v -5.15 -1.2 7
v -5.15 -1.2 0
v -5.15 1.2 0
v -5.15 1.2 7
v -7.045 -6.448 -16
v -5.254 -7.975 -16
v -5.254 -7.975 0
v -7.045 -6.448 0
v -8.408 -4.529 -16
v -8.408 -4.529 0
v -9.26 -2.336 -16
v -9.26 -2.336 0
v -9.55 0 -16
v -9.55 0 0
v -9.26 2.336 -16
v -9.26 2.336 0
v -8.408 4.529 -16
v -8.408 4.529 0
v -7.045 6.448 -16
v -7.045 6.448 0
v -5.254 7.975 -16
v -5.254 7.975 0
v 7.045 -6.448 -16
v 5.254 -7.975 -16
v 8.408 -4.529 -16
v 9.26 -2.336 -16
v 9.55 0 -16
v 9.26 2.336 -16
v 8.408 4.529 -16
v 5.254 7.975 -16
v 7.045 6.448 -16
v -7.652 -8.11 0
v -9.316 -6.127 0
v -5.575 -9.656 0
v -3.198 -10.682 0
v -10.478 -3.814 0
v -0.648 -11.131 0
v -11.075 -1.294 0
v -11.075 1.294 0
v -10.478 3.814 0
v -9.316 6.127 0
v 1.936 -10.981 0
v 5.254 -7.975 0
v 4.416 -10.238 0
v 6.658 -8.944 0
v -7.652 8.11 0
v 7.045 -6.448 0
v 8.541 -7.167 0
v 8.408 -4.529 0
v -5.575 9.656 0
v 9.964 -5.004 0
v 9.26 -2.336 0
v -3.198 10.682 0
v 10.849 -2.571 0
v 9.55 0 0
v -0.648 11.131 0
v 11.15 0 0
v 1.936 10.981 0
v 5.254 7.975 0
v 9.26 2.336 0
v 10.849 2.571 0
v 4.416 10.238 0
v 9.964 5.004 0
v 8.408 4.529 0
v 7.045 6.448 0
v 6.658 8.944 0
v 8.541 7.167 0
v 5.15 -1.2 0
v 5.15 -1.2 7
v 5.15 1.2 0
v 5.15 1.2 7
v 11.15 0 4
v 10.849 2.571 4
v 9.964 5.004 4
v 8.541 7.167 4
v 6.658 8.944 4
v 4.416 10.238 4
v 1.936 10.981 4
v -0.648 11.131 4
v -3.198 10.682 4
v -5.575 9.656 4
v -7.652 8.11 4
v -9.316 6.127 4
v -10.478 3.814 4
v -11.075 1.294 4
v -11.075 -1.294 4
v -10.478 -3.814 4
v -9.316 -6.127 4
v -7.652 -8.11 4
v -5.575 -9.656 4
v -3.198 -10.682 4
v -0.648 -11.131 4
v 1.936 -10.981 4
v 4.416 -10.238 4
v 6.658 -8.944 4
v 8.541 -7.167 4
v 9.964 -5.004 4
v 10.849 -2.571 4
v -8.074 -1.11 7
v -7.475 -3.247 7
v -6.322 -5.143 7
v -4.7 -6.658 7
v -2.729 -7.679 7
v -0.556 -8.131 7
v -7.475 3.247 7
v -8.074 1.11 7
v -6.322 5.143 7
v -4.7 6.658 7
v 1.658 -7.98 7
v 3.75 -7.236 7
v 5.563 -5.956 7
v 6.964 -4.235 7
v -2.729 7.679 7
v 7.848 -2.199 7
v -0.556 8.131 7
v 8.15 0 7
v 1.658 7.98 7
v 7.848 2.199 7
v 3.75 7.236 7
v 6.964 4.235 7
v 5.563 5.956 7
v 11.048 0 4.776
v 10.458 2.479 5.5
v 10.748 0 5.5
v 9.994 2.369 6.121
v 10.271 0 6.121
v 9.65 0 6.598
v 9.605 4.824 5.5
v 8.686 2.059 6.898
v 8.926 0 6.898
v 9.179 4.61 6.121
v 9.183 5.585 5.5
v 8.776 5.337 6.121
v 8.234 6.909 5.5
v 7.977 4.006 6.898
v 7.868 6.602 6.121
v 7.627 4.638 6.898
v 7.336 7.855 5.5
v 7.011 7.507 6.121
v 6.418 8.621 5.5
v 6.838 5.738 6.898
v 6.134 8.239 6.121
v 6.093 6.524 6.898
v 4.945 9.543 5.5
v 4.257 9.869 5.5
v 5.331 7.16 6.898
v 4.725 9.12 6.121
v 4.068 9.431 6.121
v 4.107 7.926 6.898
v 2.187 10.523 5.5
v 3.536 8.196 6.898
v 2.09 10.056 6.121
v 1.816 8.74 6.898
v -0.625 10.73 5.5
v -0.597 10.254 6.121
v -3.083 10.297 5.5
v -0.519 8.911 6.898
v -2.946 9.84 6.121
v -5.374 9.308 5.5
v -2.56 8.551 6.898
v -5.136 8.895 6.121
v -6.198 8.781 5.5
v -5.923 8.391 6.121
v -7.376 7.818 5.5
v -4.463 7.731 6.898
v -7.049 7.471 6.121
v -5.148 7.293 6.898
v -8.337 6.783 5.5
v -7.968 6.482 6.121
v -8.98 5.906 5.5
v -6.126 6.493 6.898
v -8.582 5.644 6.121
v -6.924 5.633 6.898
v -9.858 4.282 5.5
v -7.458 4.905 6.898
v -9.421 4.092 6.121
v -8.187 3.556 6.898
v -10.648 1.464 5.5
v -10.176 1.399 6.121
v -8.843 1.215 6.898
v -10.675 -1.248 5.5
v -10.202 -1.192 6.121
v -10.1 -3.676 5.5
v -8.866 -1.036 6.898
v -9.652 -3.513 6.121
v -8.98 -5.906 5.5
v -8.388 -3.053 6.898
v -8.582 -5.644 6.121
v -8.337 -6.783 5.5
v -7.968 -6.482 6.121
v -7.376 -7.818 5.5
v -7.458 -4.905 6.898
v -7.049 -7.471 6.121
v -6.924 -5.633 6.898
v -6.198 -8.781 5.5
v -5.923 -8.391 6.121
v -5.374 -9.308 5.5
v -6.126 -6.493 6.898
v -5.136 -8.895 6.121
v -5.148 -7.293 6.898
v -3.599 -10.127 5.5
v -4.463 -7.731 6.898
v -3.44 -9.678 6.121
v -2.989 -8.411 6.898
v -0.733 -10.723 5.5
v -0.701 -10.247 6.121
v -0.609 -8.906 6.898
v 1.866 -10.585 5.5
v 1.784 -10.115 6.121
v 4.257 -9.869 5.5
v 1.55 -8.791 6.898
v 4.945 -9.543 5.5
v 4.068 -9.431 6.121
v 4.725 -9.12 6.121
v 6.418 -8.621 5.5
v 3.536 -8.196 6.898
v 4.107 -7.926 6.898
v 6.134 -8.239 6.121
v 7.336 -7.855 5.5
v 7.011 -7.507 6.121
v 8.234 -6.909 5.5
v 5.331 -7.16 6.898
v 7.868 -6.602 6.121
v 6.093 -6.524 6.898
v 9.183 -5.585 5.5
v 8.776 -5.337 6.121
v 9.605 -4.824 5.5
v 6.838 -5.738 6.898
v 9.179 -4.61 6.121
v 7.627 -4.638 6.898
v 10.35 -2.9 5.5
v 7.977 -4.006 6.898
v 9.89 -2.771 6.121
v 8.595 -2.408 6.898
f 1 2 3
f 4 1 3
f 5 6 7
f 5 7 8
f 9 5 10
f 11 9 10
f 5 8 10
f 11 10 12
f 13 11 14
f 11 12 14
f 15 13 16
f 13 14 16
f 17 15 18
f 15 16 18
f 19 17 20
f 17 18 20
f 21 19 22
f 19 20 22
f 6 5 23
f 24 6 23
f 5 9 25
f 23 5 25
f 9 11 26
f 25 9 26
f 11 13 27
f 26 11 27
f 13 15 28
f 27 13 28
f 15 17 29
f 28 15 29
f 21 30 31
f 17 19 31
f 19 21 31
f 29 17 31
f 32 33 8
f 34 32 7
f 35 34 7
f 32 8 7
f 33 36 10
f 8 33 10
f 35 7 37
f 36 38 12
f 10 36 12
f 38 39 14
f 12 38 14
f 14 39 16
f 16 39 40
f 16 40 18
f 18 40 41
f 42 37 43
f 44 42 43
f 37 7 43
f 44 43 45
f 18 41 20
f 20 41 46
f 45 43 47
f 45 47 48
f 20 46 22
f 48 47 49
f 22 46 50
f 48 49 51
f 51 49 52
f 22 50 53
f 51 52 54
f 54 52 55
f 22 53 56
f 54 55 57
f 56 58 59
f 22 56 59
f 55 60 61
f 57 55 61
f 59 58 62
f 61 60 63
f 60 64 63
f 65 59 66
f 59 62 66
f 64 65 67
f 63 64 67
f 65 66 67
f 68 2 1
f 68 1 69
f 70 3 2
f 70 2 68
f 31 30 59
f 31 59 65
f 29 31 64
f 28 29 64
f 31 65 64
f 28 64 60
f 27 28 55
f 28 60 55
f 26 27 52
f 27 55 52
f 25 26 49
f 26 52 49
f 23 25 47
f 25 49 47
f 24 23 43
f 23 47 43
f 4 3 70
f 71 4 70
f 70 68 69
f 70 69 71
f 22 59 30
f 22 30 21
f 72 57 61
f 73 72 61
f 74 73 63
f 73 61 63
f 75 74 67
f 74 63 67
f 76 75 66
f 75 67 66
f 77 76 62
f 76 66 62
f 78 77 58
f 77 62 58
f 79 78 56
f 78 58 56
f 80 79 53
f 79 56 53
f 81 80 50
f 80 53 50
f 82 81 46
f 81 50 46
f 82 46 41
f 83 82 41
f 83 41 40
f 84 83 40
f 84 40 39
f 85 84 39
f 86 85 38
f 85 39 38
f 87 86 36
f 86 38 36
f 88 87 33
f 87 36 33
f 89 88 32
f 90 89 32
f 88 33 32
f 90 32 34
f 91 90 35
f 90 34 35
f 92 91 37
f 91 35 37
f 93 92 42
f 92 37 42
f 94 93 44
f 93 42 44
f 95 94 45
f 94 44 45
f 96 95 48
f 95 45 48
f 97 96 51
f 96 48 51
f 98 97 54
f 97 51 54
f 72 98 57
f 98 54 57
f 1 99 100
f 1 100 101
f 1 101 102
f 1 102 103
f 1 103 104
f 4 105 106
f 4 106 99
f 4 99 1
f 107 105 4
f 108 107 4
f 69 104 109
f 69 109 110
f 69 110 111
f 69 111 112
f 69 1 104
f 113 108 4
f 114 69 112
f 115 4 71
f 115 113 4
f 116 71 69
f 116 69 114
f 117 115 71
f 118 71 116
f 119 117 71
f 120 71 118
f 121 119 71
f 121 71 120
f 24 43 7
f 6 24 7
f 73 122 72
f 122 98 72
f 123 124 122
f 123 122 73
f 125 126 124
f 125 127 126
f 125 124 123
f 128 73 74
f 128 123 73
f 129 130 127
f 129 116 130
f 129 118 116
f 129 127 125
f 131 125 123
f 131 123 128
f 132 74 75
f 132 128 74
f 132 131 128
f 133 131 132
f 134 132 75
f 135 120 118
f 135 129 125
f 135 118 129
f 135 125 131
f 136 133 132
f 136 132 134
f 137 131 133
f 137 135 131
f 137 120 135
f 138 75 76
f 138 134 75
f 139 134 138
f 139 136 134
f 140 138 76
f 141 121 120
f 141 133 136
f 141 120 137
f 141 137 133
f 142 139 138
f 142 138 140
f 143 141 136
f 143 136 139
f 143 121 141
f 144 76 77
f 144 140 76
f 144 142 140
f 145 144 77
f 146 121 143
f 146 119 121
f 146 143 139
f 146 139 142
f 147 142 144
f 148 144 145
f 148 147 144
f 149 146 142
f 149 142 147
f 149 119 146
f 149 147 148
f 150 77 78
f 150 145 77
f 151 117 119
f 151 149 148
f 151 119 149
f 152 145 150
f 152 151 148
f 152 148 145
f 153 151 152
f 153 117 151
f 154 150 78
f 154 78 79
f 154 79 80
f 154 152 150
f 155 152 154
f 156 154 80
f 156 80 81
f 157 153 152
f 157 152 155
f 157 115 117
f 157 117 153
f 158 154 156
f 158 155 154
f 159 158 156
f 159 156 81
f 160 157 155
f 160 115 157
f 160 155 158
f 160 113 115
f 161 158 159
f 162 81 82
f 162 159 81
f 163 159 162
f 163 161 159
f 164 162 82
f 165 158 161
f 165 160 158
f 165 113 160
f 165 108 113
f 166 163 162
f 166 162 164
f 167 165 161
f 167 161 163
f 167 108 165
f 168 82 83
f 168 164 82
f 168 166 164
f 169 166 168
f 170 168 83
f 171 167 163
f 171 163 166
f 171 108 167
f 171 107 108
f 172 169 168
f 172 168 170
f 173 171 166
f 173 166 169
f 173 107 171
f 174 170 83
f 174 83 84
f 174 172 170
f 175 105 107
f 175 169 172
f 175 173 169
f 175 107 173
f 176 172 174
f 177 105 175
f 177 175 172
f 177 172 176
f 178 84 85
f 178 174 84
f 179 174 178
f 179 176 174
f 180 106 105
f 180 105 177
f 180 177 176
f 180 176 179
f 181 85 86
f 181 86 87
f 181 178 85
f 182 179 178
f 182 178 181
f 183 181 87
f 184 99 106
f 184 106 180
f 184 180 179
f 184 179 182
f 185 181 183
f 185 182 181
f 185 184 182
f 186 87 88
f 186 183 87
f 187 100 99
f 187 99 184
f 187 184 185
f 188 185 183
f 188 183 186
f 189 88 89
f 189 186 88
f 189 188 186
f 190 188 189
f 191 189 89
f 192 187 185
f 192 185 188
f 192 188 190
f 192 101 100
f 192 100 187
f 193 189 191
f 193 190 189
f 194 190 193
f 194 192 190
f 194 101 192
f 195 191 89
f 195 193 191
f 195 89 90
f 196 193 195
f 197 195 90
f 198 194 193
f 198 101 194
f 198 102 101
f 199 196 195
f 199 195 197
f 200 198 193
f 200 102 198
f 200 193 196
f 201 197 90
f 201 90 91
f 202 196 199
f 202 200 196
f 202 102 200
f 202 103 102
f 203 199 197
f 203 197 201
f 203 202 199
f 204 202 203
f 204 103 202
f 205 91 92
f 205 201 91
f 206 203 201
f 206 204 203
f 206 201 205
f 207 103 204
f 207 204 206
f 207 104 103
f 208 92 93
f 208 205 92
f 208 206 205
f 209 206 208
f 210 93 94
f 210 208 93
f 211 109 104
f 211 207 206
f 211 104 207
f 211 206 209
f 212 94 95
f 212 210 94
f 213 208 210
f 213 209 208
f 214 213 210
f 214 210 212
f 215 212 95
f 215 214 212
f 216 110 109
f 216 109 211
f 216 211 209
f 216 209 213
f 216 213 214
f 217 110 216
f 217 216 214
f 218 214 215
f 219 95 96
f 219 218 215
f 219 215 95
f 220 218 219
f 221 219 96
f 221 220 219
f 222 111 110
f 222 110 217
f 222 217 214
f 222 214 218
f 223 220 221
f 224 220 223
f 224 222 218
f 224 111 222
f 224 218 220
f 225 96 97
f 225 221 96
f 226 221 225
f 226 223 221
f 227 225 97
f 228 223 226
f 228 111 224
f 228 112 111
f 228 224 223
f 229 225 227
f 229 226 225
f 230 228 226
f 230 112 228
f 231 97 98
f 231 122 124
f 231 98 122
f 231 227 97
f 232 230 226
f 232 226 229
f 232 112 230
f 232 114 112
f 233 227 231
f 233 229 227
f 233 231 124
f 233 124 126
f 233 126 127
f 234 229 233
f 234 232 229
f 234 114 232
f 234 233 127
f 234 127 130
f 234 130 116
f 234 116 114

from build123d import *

# Parameters (mm, degrees)
SKETCH025_R  = 11.15
SKETCH025_W  = 10.3
SKETCH025_H  = 2.4
PAD081_DEPTH = 7
PAD083_DEPTH = 16
FILLET005_R  = 3


with BuildPart() as part:
    # Sketch025 → Pad081 (new body)
    with BuildSketch(Plane.XY):
        Circle(SKETCH025_R)
        Rectangle(SKETCH025_W, SKETCH025_H, mode=Mode.SUBTRACT)
    extrude(amount=PAD081_DEPTH)

    # Sketch026 → Pad083 (join)
    with BuildSketch(Plane(origin=(0, 0, 0), x_dir=(-1, 0, 0), z_dir=(0, 0, -1))):
        with BuildLine():
            Line((-5.253749, 7.975), (5.253749, 7.975))
            ThreePointArc((5.253749, -7.975), (9.55, 0), (5.253749, 7.975))
            Line((-5.253749, -7.975), (5.253749, -7.975))
            ThreePointArc((-5.253749, 7.975), (-9.55, 0), (-5.253749, -7.975))
        make_face()
    extrude(amount=PAD083_DEPTH)

    # Fillet005
    fillet005_edges = [part.edges().sort_by_distance(p)[0] for p in [
        (-11.15, 0, 7),
    ]]
    fillet(fillet005_edges, radius=FILLET005_R)


solid = part.part
